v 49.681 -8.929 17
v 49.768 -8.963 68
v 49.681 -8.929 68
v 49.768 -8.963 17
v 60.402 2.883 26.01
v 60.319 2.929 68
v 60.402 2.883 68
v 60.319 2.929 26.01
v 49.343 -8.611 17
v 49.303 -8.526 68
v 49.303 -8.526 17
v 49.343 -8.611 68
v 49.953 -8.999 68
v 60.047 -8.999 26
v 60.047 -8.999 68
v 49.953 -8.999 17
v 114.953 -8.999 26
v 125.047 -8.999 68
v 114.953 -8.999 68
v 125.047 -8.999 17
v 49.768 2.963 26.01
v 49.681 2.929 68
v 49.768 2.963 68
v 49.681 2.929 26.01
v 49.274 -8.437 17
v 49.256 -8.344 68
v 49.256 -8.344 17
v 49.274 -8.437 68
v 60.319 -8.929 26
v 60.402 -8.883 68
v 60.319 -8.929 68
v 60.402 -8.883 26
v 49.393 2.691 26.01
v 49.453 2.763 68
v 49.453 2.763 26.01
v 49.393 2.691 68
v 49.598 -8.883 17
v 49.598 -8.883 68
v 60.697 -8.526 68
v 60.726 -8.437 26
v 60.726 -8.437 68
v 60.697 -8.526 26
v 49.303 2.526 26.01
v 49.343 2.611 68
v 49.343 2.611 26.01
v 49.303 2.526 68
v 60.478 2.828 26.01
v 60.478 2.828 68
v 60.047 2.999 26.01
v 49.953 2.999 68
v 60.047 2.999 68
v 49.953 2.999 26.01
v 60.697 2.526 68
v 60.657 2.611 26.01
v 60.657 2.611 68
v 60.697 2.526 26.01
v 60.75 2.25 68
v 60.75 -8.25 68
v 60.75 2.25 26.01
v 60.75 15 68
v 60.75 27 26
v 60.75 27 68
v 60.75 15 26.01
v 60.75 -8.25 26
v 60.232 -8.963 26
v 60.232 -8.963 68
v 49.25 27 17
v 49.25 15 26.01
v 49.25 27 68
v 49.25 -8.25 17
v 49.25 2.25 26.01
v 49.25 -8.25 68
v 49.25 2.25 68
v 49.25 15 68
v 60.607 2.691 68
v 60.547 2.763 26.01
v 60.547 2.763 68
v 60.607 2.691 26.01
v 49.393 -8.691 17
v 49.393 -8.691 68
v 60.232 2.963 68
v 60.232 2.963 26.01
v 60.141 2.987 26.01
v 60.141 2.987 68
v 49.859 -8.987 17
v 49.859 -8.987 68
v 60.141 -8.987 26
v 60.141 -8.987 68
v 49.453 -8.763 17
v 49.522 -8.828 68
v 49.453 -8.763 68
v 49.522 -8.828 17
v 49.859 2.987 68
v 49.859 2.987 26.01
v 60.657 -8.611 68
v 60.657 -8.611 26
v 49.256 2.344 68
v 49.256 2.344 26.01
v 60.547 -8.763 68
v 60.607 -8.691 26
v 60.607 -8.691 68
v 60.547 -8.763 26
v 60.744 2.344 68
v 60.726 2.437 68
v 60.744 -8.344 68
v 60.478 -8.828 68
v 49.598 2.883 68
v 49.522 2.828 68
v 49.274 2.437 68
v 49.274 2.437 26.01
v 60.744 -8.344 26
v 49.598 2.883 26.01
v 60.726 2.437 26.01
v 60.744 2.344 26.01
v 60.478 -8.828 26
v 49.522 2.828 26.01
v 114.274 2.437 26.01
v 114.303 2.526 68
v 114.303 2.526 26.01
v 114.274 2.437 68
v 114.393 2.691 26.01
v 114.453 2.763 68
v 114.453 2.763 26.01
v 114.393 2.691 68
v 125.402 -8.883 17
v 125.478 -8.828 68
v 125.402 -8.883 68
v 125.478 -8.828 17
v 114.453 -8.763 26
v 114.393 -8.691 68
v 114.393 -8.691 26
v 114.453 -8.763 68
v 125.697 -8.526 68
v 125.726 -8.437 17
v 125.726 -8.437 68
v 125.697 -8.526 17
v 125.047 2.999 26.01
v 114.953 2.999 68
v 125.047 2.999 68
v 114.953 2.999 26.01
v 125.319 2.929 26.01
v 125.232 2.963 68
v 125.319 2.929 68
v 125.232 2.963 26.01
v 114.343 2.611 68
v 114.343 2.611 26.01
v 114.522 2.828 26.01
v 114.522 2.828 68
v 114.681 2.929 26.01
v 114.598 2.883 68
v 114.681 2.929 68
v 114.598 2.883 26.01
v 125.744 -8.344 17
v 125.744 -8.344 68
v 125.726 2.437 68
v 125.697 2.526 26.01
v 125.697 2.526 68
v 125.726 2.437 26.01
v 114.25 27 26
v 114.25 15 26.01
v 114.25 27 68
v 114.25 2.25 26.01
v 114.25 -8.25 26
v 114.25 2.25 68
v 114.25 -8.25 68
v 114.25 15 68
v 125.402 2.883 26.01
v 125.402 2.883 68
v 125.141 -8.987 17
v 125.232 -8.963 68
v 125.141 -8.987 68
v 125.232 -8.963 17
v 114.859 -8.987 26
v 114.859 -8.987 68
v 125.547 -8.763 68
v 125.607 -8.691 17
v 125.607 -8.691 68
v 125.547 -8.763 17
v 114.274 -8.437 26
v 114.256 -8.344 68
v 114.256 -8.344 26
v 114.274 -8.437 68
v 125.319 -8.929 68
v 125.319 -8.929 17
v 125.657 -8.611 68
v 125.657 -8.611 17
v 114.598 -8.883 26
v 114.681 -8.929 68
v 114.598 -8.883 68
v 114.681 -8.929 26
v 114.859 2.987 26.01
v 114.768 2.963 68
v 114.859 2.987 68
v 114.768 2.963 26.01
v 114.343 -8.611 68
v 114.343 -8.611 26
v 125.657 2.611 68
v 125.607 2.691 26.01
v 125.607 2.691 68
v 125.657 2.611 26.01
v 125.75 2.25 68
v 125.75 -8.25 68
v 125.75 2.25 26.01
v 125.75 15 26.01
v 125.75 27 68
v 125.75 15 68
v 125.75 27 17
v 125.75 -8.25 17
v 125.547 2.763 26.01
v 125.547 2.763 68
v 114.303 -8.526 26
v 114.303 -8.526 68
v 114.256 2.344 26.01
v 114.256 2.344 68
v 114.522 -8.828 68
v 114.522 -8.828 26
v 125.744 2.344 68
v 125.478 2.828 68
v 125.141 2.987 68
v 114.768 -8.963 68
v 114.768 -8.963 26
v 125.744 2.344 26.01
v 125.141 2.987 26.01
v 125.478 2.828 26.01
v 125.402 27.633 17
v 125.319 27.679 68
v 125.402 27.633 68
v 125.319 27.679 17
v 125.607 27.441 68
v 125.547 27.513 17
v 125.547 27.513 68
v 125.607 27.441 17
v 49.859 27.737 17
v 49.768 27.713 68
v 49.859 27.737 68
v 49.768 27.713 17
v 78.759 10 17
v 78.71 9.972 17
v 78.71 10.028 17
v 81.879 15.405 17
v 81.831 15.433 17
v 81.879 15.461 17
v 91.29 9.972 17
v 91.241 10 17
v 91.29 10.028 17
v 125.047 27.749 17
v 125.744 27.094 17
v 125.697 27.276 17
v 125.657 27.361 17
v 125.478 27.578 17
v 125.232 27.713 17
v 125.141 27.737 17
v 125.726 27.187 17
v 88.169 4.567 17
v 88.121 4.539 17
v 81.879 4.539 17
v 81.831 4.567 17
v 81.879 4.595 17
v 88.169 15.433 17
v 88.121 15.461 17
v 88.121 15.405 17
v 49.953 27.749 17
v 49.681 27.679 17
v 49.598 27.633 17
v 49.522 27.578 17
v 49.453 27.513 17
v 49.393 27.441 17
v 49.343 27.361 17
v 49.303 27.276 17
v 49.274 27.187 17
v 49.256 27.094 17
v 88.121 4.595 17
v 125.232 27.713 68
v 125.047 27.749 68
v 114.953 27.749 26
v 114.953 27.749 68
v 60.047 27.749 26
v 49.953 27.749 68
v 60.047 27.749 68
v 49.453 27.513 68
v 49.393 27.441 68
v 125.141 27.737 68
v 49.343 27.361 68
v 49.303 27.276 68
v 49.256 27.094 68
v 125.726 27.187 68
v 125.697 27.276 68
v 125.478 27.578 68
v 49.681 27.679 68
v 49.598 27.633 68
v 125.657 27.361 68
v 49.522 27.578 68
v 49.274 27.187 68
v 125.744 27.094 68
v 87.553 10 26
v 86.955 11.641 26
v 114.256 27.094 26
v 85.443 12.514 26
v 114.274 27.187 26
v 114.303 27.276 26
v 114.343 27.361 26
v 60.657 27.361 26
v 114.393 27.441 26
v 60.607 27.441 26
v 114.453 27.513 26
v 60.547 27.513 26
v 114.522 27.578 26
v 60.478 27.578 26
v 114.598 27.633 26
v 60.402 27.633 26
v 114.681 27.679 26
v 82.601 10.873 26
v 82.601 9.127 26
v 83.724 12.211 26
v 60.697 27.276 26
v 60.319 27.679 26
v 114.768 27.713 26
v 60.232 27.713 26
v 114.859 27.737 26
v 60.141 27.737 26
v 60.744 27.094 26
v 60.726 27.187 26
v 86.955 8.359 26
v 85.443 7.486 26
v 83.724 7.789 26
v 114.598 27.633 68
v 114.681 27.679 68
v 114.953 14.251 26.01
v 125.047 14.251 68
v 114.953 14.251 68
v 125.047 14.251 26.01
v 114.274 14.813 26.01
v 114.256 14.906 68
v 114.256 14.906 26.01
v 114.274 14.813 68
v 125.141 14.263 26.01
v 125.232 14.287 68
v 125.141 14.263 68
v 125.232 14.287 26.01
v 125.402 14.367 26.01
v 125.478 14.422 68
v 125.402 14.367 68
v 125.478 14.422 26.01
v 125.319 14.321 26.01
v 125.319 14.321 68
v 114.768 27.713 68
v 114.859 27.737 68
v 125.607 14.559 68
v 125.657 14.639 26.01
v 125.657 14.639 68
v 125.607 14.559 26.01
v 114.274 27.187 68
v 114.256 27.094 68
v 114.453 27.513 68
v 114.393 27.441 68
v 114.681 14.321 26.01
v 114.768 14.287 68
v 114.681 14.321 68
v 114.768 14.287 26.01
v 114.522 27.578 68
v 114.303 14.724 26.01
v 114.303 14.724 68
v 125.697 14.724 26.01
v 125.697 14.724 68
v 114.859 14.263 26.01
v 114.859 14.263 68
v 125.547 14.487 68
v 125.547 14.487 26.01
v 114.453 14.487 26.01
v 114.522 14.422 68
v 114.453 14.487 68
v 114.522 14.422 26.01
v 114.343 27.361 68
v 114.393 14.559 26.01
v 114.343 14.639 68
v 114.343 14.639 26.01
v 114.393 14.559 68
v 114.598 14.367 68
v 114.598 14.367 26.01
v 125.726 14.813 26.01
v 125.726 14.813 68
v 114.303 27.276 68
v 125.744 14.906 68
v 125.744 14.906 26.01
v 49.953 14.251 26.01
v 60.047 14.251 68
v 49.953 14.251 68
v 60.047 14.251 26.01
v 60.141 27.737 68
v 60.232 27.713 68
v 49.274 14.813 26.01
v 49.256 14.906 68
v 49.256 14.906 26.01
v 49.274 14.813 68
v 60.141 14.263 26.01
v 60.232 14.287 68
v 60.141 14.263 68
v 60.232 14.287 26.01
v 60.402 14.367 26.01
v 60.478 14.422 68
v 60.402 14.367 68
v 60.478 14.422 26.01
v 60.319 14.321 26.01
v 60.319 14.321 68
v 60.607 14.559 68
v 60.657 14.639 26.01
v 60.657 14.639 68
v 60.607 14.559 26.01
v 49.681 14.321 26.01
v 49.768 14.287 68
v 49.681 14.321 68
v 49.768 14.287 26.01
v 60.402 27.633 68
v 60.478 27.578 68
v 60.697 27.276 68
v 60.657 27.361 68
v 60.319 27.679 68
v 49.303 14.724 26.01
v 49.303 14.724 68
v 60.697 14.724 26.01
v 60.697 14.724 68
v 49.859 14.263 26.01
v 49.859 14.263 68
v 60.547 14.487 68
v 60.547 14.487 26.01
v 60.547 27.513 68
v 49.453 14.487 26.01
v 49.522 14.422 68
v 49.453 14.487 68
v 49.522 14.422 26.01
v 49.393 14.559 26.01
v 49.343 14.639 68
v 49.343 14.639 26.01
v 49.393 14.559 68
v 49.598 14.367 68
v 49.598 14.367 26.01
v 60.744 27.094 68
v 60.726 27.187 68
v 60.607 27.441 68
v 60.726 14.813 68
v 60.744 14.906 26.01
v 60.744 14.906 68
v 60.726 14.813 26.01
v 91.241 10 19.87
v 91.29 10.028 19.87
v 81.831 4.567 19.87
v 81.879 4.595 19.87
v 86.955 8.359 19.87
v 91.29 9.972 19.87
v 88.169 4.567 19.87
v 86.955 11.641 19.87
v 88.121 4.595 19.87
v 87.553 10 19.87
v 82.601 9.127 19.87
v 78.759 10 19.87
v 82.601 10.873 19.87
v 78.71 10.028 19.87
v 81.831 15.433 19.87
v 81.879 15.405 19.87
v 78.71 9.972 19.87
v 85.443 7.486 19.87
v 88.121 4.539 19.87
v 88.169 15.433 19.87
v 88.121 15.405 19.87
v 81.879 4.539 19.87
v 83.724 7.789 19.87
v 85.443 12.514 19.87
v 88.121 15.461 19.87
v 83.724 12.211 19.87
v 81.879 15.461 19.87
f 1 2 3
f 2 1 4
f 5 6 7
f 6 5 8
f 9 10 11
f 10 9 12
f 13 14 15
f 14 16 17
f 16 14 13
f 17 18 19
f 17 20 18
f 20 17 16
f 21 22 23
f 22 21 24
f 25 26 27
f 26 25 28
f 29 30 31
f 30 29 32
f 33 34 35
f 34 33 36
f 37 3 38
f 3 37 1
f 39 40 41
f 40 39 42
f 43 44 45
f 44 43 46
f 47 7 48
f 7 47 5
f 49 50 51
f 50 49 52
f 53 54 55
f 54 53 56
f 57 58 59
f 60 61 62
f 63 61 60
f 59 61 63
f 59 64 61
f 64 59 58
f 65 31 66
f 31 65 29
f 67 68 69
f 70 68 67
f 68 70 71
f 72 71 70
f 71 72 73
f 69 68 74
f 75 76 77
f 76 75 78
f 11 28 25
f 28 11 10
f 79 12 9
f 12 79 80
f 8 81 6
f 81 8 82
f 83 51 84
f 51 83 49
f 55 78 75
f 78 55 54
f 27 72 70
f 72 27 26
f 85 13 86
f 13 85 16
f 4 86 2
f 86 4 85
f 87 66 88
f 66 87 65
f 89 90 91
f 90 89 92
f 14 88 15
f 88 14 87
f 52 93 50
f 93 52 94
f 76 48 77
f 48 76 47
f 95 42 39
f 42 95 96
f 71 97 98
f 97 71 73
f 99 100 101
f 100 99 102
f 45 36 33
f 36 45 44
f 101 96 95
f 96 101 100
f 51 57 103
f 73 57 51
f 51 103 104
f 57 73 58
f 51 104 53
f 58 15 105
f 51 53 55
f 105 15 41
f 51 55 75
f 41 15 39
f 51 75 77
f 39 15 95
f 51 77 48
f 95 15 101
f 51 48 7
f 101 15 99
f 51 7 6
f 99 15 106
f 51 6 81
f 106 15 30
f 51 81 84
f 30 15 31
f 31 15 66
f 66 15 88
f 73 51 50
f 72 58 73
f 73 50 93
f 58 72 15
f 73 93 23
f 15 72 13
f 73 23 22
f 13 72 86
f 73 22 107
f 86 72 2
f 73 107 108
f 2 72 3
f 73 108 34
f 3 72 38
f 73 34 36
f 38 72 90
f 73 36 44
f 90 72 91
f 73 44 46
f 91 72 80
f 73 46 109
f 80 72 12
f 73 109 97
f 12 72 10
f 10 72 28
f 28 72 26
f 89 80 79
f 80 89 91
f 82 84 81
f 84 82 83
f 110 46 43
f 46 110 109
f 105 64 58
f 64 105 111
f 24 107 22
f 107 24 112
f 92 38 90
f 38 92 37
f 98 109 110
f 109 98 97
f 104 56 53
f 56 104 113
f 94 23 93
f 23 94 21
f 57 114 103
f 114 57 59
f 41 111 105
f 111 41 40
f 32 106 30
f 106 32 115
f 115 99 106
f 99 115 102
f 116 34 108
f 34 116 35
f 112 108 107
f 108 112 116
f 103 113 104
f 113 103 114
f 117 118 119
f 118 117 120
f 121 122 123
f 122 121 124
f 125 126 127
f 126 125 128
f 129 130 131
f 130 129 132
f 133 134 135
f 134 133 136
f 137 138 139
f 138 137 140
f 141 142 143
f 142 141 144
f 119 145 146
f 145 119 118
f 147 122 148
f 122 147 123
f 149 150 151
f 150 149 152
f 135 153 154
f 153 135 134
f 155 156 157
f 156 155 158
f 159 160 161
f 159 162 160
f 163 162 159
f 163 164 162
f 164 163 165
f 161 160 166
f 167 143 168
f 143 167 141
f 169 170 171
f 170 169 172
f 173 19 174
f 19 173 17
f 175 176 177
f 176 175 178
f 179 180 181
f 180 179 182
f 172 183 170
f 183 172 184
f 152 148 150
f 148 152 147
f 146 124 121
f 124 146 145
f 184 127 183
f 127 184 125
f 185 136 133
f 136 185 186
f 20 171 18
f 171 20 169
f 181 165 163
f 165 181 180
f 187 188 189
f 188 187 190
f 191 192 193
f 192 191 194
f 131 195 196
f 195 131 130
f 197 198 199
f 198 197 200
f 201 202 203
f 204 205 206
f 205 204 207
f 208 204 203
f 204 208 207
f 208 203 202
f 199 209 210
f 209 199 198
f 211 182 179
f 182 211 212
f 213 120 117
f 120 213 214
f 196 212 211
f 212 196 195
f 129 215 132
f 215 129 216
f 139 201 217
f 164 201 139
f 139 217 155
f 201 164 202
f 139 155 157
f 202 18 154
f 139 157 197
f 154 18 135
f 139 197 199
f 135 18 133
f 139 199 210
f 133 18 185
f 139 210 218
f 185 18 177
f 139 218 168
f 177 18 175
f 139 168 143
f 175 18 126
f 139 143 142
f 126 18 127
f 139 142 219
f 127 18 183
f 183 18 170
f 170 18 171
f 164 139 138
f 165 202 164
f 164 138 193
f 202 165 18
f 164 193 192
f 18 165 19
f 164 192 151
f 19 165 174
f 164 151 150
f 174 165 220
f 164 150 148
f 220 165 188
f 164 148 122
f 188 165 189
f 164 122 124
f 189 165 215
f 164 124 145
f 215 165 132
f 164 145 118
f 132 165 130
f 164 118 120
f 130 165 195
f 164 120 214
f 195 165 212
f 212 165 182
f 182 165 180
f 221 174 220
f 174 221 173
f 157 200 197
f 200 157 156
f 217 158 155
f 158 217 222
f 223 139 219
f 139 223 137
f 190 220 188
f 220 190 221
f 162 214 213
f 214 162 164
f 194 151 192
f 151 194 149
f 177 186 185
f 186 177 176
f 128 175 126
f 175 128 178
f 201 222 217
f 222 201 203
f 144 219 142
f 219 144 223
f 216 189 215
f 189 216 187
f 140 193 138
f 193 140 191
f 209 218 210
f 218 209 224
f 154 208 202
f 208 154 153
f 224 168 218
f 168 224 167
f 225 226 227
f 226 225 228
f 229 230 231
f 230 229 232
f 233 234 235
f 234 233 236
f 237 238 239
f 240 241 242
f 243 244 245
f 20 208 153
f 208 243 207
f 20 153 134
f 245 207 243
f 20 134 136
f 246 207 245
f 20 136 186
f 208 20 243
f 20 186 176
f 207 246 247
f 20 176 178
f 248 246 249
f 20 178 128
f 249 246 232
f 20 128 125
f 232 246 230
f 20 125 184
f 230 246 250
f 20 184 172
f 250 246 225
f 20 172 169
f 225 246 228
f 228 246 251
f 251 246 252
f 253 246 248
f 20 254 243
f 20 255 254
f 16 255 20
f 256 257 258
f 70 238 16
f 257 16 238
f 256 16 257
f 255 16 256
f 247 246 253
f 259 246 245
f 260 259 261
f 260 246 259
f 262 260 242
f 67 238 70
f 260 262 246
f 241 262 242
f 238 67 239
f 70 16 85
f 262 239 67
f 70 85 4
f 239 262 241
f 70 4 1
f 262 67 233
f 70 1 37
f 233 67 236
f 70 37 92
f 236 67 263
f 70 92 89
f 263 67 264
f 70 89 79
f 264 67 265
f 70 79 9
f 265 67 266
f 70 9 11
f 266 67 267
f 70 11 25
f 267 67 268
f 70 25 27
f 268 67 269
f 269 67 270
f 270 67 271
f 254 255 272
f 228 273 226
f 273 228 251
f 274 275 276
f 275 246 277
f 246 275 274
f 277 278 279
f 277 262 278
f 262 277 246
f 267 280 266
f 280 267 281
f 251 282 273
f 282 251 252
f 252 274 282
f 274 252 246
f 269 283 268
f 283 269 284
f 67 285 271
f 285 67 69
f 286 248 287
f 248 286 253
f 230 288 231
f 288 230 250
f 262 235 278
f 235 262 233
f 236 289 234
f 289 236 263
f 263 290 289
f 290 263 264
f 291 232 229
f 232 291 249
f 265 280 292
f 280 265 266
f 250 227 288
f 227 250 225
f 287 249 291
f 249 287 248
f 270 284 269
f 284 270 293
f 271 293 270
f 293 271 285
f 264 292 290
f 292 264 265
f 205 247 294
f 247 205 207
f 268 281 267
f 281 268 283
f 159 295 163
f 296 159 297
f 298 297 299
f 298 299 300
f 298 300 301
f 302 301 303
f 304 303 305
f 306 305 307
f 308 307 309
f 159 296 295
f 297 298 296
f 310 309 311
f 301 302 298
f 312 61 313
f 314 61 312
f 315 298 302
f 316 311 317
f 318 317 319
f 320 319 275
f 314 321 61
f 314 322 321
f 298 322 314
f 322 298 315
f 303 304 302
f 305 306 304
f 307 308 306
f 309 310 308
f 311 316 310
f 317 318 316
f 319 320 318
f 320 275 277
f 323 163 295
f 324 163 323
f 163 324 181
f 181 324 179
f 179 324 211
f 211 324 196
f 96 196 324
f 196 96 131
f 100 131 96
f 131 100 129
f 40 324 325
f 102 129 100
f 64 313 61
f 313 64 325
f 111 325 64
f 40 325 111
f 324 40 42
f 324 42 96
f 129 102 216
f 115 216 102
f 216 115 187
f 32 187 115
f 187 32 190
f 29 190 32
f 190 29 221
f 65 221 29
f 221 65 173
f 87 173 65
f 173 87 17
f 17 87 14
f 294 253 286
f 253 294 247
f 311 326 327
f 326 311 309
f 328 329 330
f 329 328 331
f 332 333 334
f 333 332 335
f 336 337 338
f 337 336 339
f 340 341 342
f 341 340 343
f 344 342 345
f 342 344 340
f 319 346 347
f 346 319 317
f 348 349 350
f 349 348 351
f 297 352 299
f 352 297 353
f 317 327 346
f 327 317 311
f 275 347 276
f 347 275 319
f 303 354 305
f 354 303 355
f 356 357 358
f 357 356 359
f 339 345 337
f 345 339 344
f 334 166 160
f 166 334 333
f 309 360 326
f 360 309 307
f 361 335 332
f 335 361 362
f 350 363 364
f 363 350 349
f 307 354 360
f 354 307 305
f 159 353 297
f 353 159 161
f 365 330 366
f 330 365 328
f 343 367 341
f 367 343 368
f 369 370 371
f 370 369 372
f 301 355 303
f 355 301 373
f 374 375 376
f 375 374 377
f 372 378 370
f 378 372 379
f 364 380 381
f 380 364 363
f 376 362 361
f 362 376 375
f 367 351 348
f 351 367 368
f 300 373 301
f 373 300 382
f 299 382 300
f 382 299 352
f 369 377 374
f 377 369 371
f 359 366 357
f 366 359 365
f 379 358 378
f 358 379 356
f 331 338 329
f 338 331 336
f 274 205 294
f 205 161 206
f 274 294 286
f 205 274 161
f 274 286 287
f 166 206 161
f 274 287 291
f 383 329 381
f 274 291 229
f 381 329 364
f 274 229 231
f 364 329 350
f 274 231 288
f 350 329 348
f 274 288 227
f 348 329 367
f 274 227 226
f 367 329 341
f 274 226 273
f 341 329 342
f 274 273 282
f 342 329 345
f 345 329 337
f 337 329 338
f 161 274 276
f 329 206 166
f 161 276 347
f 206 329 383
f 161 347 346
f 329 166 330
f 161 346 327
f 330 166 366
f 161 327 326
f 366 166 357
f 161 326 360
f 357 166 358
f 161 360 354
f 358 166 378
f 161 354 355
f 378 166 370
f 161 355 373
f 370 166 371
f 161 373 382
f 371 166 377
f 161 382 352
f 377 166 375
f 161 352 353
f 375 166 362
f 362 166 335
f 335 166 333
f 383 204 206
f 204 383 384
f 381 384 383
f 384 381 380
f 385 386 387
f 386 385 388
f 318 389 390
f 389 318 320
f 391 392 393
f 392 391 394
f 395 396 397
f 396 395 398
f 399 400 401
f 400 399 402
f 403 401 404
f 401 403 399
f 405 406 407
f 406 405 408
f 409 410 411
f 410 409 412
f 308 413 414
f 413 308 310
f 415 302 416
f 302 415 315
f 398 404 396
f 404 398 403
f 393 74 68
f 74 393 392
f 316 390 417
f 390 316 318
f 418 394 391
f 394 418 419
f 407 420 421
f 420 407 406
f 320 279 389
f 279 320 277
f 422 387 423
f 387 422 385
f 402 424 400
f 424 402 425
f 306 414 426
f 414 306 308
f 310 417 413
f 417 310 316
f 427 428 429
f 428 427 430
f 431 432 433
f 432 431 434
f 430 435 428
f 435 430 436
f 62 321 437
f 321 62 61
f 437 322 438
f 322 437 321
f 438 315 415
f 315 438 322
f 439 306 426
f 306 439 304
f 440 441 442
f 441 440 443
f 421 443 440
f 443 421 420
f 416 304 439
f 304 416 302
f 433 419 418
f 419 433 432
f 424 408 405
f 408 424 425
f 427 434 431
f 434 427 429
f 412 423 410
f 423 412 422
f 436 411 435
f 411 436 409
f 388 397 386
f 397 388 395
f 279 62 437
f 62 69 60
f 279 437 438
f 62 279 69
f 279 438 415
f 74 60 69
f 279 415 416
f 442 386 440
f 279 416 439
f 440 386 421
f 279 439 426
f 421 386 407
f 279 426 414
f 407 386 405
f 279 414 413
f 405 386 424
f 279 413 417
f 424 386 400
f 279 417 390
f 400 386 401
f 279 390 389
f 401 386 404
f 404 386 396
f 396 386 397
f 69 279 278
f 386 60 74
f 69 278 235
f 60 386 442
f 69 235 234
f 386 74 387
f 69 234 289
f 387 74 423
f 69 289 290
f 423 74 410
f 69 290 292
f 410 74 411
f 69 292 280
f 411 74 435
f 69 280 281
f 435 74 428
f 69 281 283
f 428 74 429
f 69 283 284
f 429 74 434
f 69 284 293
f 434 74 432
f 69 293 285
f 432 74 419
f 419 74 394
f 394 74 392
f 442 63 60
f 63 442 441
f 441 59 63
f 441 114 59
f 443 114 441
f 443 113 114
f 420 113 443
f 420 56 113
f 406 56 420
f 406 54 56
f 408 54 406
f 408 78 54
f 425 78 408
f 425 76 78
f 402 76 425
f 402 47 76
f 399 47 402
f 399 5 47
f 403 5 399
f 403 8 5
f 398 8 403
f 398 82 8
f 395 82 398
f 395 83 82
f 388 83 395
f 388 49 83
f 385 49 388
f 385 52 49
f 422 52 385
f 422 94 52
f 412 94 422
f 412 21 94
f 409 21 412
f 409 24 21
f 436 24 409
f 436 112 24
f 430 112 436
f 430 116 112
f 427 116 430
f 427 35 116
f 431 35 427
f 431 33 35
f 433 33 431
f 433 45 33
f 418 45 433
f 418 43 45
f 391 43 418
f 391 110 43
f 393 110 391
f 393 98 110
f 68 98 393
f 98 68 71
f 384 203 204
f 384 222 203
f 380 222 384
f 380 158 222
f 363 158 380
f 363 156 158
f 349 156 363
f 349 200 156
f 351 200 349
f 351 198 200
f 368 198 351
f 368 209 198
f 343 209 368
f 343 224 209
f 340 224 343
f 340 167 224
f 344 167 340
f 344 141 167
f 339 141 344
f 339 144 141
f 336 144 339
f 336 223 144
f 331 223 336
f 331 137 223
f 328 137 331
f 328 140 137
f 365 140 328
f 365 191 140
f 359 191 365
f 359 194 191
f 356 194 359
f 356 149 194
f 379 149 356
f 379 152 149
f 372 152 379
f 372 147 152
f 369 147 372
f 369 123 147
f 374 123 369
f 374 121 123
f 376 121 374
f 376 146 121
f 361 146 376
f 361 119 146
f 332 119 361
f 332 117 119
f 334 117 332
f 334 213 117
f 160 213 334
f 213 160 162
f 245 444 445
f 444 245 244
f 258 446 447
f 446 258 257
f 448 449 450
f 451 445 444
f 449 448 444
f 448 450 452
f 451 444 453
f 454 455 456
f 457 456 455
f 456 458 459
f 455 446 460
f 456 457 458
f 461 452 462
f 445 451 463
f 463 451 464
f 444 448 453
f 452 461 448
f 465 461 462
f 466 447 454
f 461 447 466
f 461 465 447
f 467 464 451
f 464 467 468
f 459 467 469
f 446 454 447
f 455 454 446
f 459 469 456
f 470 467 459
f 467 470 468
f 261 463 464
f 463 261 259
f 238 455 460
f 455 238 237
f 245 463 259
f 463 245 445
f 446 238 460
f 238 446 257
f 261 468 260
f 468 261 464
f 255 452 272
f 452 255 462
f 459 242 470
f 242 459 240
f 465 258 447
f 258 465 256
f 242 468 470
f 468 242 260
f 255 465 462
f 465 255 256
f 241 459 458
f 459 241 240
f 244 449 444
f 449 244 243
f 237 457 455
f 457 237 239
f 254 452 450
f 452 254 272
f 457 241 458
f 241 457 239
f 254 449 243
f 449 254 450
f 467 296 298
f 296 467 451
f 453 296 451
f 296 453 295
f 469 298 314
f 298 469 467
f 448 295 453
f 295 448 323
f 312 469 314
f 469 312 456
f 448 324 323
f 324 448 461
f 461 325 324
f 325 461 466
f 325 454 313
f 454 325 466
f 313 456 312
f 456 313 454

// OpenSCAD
use <MCAD/shapes.scad>

module iphone4s_withcase() {
	$fn = 50;
	minkowski() {
			cube([118.5, 61.9, 11.75]);
			cylinder(r = 5, h = 1);
	}
}

module nintendo_ds() {
}

module iphone4s_clamp() {
		difference() {
				difference() {
						 translate([25, 12, -13])
							 rotate([90, 0, 0])  cube([75, 50, 11.75 * 3]);
						 rotate([90, 0, 0])  iphone4s_withcase();
				}
				translate([35, -35, -5])
						cube([55, 50, 50]);
		}

}

module iphone4s_rounded_clamp() {
		$fn=50;
		minkowski() {
				iphone4s_clamp();
				translate([25, 15, 30]) cylinder(r = 0.75, h = 1);
		}
}

module quarter20Nut() {
	union() {
		// .438" - .428" across the flats, .226" - 0.212" height
		hexagon(size = 0.430 * 25.4, height = 0.226 * 25.4);
		// tap size .2010 (aka #7 drill)
		translate([0, 0, -5])
			cylinder(r = (.2010 / 2) * 25.4, h = 1 * 25.4);
	}
}

module iphone4_tripod() {
		difference() {
				iphone4s_rounded_clamp();
				translate([85, 10, 17]) quarter20Nut();
		}
}

iphone4_tripod();
